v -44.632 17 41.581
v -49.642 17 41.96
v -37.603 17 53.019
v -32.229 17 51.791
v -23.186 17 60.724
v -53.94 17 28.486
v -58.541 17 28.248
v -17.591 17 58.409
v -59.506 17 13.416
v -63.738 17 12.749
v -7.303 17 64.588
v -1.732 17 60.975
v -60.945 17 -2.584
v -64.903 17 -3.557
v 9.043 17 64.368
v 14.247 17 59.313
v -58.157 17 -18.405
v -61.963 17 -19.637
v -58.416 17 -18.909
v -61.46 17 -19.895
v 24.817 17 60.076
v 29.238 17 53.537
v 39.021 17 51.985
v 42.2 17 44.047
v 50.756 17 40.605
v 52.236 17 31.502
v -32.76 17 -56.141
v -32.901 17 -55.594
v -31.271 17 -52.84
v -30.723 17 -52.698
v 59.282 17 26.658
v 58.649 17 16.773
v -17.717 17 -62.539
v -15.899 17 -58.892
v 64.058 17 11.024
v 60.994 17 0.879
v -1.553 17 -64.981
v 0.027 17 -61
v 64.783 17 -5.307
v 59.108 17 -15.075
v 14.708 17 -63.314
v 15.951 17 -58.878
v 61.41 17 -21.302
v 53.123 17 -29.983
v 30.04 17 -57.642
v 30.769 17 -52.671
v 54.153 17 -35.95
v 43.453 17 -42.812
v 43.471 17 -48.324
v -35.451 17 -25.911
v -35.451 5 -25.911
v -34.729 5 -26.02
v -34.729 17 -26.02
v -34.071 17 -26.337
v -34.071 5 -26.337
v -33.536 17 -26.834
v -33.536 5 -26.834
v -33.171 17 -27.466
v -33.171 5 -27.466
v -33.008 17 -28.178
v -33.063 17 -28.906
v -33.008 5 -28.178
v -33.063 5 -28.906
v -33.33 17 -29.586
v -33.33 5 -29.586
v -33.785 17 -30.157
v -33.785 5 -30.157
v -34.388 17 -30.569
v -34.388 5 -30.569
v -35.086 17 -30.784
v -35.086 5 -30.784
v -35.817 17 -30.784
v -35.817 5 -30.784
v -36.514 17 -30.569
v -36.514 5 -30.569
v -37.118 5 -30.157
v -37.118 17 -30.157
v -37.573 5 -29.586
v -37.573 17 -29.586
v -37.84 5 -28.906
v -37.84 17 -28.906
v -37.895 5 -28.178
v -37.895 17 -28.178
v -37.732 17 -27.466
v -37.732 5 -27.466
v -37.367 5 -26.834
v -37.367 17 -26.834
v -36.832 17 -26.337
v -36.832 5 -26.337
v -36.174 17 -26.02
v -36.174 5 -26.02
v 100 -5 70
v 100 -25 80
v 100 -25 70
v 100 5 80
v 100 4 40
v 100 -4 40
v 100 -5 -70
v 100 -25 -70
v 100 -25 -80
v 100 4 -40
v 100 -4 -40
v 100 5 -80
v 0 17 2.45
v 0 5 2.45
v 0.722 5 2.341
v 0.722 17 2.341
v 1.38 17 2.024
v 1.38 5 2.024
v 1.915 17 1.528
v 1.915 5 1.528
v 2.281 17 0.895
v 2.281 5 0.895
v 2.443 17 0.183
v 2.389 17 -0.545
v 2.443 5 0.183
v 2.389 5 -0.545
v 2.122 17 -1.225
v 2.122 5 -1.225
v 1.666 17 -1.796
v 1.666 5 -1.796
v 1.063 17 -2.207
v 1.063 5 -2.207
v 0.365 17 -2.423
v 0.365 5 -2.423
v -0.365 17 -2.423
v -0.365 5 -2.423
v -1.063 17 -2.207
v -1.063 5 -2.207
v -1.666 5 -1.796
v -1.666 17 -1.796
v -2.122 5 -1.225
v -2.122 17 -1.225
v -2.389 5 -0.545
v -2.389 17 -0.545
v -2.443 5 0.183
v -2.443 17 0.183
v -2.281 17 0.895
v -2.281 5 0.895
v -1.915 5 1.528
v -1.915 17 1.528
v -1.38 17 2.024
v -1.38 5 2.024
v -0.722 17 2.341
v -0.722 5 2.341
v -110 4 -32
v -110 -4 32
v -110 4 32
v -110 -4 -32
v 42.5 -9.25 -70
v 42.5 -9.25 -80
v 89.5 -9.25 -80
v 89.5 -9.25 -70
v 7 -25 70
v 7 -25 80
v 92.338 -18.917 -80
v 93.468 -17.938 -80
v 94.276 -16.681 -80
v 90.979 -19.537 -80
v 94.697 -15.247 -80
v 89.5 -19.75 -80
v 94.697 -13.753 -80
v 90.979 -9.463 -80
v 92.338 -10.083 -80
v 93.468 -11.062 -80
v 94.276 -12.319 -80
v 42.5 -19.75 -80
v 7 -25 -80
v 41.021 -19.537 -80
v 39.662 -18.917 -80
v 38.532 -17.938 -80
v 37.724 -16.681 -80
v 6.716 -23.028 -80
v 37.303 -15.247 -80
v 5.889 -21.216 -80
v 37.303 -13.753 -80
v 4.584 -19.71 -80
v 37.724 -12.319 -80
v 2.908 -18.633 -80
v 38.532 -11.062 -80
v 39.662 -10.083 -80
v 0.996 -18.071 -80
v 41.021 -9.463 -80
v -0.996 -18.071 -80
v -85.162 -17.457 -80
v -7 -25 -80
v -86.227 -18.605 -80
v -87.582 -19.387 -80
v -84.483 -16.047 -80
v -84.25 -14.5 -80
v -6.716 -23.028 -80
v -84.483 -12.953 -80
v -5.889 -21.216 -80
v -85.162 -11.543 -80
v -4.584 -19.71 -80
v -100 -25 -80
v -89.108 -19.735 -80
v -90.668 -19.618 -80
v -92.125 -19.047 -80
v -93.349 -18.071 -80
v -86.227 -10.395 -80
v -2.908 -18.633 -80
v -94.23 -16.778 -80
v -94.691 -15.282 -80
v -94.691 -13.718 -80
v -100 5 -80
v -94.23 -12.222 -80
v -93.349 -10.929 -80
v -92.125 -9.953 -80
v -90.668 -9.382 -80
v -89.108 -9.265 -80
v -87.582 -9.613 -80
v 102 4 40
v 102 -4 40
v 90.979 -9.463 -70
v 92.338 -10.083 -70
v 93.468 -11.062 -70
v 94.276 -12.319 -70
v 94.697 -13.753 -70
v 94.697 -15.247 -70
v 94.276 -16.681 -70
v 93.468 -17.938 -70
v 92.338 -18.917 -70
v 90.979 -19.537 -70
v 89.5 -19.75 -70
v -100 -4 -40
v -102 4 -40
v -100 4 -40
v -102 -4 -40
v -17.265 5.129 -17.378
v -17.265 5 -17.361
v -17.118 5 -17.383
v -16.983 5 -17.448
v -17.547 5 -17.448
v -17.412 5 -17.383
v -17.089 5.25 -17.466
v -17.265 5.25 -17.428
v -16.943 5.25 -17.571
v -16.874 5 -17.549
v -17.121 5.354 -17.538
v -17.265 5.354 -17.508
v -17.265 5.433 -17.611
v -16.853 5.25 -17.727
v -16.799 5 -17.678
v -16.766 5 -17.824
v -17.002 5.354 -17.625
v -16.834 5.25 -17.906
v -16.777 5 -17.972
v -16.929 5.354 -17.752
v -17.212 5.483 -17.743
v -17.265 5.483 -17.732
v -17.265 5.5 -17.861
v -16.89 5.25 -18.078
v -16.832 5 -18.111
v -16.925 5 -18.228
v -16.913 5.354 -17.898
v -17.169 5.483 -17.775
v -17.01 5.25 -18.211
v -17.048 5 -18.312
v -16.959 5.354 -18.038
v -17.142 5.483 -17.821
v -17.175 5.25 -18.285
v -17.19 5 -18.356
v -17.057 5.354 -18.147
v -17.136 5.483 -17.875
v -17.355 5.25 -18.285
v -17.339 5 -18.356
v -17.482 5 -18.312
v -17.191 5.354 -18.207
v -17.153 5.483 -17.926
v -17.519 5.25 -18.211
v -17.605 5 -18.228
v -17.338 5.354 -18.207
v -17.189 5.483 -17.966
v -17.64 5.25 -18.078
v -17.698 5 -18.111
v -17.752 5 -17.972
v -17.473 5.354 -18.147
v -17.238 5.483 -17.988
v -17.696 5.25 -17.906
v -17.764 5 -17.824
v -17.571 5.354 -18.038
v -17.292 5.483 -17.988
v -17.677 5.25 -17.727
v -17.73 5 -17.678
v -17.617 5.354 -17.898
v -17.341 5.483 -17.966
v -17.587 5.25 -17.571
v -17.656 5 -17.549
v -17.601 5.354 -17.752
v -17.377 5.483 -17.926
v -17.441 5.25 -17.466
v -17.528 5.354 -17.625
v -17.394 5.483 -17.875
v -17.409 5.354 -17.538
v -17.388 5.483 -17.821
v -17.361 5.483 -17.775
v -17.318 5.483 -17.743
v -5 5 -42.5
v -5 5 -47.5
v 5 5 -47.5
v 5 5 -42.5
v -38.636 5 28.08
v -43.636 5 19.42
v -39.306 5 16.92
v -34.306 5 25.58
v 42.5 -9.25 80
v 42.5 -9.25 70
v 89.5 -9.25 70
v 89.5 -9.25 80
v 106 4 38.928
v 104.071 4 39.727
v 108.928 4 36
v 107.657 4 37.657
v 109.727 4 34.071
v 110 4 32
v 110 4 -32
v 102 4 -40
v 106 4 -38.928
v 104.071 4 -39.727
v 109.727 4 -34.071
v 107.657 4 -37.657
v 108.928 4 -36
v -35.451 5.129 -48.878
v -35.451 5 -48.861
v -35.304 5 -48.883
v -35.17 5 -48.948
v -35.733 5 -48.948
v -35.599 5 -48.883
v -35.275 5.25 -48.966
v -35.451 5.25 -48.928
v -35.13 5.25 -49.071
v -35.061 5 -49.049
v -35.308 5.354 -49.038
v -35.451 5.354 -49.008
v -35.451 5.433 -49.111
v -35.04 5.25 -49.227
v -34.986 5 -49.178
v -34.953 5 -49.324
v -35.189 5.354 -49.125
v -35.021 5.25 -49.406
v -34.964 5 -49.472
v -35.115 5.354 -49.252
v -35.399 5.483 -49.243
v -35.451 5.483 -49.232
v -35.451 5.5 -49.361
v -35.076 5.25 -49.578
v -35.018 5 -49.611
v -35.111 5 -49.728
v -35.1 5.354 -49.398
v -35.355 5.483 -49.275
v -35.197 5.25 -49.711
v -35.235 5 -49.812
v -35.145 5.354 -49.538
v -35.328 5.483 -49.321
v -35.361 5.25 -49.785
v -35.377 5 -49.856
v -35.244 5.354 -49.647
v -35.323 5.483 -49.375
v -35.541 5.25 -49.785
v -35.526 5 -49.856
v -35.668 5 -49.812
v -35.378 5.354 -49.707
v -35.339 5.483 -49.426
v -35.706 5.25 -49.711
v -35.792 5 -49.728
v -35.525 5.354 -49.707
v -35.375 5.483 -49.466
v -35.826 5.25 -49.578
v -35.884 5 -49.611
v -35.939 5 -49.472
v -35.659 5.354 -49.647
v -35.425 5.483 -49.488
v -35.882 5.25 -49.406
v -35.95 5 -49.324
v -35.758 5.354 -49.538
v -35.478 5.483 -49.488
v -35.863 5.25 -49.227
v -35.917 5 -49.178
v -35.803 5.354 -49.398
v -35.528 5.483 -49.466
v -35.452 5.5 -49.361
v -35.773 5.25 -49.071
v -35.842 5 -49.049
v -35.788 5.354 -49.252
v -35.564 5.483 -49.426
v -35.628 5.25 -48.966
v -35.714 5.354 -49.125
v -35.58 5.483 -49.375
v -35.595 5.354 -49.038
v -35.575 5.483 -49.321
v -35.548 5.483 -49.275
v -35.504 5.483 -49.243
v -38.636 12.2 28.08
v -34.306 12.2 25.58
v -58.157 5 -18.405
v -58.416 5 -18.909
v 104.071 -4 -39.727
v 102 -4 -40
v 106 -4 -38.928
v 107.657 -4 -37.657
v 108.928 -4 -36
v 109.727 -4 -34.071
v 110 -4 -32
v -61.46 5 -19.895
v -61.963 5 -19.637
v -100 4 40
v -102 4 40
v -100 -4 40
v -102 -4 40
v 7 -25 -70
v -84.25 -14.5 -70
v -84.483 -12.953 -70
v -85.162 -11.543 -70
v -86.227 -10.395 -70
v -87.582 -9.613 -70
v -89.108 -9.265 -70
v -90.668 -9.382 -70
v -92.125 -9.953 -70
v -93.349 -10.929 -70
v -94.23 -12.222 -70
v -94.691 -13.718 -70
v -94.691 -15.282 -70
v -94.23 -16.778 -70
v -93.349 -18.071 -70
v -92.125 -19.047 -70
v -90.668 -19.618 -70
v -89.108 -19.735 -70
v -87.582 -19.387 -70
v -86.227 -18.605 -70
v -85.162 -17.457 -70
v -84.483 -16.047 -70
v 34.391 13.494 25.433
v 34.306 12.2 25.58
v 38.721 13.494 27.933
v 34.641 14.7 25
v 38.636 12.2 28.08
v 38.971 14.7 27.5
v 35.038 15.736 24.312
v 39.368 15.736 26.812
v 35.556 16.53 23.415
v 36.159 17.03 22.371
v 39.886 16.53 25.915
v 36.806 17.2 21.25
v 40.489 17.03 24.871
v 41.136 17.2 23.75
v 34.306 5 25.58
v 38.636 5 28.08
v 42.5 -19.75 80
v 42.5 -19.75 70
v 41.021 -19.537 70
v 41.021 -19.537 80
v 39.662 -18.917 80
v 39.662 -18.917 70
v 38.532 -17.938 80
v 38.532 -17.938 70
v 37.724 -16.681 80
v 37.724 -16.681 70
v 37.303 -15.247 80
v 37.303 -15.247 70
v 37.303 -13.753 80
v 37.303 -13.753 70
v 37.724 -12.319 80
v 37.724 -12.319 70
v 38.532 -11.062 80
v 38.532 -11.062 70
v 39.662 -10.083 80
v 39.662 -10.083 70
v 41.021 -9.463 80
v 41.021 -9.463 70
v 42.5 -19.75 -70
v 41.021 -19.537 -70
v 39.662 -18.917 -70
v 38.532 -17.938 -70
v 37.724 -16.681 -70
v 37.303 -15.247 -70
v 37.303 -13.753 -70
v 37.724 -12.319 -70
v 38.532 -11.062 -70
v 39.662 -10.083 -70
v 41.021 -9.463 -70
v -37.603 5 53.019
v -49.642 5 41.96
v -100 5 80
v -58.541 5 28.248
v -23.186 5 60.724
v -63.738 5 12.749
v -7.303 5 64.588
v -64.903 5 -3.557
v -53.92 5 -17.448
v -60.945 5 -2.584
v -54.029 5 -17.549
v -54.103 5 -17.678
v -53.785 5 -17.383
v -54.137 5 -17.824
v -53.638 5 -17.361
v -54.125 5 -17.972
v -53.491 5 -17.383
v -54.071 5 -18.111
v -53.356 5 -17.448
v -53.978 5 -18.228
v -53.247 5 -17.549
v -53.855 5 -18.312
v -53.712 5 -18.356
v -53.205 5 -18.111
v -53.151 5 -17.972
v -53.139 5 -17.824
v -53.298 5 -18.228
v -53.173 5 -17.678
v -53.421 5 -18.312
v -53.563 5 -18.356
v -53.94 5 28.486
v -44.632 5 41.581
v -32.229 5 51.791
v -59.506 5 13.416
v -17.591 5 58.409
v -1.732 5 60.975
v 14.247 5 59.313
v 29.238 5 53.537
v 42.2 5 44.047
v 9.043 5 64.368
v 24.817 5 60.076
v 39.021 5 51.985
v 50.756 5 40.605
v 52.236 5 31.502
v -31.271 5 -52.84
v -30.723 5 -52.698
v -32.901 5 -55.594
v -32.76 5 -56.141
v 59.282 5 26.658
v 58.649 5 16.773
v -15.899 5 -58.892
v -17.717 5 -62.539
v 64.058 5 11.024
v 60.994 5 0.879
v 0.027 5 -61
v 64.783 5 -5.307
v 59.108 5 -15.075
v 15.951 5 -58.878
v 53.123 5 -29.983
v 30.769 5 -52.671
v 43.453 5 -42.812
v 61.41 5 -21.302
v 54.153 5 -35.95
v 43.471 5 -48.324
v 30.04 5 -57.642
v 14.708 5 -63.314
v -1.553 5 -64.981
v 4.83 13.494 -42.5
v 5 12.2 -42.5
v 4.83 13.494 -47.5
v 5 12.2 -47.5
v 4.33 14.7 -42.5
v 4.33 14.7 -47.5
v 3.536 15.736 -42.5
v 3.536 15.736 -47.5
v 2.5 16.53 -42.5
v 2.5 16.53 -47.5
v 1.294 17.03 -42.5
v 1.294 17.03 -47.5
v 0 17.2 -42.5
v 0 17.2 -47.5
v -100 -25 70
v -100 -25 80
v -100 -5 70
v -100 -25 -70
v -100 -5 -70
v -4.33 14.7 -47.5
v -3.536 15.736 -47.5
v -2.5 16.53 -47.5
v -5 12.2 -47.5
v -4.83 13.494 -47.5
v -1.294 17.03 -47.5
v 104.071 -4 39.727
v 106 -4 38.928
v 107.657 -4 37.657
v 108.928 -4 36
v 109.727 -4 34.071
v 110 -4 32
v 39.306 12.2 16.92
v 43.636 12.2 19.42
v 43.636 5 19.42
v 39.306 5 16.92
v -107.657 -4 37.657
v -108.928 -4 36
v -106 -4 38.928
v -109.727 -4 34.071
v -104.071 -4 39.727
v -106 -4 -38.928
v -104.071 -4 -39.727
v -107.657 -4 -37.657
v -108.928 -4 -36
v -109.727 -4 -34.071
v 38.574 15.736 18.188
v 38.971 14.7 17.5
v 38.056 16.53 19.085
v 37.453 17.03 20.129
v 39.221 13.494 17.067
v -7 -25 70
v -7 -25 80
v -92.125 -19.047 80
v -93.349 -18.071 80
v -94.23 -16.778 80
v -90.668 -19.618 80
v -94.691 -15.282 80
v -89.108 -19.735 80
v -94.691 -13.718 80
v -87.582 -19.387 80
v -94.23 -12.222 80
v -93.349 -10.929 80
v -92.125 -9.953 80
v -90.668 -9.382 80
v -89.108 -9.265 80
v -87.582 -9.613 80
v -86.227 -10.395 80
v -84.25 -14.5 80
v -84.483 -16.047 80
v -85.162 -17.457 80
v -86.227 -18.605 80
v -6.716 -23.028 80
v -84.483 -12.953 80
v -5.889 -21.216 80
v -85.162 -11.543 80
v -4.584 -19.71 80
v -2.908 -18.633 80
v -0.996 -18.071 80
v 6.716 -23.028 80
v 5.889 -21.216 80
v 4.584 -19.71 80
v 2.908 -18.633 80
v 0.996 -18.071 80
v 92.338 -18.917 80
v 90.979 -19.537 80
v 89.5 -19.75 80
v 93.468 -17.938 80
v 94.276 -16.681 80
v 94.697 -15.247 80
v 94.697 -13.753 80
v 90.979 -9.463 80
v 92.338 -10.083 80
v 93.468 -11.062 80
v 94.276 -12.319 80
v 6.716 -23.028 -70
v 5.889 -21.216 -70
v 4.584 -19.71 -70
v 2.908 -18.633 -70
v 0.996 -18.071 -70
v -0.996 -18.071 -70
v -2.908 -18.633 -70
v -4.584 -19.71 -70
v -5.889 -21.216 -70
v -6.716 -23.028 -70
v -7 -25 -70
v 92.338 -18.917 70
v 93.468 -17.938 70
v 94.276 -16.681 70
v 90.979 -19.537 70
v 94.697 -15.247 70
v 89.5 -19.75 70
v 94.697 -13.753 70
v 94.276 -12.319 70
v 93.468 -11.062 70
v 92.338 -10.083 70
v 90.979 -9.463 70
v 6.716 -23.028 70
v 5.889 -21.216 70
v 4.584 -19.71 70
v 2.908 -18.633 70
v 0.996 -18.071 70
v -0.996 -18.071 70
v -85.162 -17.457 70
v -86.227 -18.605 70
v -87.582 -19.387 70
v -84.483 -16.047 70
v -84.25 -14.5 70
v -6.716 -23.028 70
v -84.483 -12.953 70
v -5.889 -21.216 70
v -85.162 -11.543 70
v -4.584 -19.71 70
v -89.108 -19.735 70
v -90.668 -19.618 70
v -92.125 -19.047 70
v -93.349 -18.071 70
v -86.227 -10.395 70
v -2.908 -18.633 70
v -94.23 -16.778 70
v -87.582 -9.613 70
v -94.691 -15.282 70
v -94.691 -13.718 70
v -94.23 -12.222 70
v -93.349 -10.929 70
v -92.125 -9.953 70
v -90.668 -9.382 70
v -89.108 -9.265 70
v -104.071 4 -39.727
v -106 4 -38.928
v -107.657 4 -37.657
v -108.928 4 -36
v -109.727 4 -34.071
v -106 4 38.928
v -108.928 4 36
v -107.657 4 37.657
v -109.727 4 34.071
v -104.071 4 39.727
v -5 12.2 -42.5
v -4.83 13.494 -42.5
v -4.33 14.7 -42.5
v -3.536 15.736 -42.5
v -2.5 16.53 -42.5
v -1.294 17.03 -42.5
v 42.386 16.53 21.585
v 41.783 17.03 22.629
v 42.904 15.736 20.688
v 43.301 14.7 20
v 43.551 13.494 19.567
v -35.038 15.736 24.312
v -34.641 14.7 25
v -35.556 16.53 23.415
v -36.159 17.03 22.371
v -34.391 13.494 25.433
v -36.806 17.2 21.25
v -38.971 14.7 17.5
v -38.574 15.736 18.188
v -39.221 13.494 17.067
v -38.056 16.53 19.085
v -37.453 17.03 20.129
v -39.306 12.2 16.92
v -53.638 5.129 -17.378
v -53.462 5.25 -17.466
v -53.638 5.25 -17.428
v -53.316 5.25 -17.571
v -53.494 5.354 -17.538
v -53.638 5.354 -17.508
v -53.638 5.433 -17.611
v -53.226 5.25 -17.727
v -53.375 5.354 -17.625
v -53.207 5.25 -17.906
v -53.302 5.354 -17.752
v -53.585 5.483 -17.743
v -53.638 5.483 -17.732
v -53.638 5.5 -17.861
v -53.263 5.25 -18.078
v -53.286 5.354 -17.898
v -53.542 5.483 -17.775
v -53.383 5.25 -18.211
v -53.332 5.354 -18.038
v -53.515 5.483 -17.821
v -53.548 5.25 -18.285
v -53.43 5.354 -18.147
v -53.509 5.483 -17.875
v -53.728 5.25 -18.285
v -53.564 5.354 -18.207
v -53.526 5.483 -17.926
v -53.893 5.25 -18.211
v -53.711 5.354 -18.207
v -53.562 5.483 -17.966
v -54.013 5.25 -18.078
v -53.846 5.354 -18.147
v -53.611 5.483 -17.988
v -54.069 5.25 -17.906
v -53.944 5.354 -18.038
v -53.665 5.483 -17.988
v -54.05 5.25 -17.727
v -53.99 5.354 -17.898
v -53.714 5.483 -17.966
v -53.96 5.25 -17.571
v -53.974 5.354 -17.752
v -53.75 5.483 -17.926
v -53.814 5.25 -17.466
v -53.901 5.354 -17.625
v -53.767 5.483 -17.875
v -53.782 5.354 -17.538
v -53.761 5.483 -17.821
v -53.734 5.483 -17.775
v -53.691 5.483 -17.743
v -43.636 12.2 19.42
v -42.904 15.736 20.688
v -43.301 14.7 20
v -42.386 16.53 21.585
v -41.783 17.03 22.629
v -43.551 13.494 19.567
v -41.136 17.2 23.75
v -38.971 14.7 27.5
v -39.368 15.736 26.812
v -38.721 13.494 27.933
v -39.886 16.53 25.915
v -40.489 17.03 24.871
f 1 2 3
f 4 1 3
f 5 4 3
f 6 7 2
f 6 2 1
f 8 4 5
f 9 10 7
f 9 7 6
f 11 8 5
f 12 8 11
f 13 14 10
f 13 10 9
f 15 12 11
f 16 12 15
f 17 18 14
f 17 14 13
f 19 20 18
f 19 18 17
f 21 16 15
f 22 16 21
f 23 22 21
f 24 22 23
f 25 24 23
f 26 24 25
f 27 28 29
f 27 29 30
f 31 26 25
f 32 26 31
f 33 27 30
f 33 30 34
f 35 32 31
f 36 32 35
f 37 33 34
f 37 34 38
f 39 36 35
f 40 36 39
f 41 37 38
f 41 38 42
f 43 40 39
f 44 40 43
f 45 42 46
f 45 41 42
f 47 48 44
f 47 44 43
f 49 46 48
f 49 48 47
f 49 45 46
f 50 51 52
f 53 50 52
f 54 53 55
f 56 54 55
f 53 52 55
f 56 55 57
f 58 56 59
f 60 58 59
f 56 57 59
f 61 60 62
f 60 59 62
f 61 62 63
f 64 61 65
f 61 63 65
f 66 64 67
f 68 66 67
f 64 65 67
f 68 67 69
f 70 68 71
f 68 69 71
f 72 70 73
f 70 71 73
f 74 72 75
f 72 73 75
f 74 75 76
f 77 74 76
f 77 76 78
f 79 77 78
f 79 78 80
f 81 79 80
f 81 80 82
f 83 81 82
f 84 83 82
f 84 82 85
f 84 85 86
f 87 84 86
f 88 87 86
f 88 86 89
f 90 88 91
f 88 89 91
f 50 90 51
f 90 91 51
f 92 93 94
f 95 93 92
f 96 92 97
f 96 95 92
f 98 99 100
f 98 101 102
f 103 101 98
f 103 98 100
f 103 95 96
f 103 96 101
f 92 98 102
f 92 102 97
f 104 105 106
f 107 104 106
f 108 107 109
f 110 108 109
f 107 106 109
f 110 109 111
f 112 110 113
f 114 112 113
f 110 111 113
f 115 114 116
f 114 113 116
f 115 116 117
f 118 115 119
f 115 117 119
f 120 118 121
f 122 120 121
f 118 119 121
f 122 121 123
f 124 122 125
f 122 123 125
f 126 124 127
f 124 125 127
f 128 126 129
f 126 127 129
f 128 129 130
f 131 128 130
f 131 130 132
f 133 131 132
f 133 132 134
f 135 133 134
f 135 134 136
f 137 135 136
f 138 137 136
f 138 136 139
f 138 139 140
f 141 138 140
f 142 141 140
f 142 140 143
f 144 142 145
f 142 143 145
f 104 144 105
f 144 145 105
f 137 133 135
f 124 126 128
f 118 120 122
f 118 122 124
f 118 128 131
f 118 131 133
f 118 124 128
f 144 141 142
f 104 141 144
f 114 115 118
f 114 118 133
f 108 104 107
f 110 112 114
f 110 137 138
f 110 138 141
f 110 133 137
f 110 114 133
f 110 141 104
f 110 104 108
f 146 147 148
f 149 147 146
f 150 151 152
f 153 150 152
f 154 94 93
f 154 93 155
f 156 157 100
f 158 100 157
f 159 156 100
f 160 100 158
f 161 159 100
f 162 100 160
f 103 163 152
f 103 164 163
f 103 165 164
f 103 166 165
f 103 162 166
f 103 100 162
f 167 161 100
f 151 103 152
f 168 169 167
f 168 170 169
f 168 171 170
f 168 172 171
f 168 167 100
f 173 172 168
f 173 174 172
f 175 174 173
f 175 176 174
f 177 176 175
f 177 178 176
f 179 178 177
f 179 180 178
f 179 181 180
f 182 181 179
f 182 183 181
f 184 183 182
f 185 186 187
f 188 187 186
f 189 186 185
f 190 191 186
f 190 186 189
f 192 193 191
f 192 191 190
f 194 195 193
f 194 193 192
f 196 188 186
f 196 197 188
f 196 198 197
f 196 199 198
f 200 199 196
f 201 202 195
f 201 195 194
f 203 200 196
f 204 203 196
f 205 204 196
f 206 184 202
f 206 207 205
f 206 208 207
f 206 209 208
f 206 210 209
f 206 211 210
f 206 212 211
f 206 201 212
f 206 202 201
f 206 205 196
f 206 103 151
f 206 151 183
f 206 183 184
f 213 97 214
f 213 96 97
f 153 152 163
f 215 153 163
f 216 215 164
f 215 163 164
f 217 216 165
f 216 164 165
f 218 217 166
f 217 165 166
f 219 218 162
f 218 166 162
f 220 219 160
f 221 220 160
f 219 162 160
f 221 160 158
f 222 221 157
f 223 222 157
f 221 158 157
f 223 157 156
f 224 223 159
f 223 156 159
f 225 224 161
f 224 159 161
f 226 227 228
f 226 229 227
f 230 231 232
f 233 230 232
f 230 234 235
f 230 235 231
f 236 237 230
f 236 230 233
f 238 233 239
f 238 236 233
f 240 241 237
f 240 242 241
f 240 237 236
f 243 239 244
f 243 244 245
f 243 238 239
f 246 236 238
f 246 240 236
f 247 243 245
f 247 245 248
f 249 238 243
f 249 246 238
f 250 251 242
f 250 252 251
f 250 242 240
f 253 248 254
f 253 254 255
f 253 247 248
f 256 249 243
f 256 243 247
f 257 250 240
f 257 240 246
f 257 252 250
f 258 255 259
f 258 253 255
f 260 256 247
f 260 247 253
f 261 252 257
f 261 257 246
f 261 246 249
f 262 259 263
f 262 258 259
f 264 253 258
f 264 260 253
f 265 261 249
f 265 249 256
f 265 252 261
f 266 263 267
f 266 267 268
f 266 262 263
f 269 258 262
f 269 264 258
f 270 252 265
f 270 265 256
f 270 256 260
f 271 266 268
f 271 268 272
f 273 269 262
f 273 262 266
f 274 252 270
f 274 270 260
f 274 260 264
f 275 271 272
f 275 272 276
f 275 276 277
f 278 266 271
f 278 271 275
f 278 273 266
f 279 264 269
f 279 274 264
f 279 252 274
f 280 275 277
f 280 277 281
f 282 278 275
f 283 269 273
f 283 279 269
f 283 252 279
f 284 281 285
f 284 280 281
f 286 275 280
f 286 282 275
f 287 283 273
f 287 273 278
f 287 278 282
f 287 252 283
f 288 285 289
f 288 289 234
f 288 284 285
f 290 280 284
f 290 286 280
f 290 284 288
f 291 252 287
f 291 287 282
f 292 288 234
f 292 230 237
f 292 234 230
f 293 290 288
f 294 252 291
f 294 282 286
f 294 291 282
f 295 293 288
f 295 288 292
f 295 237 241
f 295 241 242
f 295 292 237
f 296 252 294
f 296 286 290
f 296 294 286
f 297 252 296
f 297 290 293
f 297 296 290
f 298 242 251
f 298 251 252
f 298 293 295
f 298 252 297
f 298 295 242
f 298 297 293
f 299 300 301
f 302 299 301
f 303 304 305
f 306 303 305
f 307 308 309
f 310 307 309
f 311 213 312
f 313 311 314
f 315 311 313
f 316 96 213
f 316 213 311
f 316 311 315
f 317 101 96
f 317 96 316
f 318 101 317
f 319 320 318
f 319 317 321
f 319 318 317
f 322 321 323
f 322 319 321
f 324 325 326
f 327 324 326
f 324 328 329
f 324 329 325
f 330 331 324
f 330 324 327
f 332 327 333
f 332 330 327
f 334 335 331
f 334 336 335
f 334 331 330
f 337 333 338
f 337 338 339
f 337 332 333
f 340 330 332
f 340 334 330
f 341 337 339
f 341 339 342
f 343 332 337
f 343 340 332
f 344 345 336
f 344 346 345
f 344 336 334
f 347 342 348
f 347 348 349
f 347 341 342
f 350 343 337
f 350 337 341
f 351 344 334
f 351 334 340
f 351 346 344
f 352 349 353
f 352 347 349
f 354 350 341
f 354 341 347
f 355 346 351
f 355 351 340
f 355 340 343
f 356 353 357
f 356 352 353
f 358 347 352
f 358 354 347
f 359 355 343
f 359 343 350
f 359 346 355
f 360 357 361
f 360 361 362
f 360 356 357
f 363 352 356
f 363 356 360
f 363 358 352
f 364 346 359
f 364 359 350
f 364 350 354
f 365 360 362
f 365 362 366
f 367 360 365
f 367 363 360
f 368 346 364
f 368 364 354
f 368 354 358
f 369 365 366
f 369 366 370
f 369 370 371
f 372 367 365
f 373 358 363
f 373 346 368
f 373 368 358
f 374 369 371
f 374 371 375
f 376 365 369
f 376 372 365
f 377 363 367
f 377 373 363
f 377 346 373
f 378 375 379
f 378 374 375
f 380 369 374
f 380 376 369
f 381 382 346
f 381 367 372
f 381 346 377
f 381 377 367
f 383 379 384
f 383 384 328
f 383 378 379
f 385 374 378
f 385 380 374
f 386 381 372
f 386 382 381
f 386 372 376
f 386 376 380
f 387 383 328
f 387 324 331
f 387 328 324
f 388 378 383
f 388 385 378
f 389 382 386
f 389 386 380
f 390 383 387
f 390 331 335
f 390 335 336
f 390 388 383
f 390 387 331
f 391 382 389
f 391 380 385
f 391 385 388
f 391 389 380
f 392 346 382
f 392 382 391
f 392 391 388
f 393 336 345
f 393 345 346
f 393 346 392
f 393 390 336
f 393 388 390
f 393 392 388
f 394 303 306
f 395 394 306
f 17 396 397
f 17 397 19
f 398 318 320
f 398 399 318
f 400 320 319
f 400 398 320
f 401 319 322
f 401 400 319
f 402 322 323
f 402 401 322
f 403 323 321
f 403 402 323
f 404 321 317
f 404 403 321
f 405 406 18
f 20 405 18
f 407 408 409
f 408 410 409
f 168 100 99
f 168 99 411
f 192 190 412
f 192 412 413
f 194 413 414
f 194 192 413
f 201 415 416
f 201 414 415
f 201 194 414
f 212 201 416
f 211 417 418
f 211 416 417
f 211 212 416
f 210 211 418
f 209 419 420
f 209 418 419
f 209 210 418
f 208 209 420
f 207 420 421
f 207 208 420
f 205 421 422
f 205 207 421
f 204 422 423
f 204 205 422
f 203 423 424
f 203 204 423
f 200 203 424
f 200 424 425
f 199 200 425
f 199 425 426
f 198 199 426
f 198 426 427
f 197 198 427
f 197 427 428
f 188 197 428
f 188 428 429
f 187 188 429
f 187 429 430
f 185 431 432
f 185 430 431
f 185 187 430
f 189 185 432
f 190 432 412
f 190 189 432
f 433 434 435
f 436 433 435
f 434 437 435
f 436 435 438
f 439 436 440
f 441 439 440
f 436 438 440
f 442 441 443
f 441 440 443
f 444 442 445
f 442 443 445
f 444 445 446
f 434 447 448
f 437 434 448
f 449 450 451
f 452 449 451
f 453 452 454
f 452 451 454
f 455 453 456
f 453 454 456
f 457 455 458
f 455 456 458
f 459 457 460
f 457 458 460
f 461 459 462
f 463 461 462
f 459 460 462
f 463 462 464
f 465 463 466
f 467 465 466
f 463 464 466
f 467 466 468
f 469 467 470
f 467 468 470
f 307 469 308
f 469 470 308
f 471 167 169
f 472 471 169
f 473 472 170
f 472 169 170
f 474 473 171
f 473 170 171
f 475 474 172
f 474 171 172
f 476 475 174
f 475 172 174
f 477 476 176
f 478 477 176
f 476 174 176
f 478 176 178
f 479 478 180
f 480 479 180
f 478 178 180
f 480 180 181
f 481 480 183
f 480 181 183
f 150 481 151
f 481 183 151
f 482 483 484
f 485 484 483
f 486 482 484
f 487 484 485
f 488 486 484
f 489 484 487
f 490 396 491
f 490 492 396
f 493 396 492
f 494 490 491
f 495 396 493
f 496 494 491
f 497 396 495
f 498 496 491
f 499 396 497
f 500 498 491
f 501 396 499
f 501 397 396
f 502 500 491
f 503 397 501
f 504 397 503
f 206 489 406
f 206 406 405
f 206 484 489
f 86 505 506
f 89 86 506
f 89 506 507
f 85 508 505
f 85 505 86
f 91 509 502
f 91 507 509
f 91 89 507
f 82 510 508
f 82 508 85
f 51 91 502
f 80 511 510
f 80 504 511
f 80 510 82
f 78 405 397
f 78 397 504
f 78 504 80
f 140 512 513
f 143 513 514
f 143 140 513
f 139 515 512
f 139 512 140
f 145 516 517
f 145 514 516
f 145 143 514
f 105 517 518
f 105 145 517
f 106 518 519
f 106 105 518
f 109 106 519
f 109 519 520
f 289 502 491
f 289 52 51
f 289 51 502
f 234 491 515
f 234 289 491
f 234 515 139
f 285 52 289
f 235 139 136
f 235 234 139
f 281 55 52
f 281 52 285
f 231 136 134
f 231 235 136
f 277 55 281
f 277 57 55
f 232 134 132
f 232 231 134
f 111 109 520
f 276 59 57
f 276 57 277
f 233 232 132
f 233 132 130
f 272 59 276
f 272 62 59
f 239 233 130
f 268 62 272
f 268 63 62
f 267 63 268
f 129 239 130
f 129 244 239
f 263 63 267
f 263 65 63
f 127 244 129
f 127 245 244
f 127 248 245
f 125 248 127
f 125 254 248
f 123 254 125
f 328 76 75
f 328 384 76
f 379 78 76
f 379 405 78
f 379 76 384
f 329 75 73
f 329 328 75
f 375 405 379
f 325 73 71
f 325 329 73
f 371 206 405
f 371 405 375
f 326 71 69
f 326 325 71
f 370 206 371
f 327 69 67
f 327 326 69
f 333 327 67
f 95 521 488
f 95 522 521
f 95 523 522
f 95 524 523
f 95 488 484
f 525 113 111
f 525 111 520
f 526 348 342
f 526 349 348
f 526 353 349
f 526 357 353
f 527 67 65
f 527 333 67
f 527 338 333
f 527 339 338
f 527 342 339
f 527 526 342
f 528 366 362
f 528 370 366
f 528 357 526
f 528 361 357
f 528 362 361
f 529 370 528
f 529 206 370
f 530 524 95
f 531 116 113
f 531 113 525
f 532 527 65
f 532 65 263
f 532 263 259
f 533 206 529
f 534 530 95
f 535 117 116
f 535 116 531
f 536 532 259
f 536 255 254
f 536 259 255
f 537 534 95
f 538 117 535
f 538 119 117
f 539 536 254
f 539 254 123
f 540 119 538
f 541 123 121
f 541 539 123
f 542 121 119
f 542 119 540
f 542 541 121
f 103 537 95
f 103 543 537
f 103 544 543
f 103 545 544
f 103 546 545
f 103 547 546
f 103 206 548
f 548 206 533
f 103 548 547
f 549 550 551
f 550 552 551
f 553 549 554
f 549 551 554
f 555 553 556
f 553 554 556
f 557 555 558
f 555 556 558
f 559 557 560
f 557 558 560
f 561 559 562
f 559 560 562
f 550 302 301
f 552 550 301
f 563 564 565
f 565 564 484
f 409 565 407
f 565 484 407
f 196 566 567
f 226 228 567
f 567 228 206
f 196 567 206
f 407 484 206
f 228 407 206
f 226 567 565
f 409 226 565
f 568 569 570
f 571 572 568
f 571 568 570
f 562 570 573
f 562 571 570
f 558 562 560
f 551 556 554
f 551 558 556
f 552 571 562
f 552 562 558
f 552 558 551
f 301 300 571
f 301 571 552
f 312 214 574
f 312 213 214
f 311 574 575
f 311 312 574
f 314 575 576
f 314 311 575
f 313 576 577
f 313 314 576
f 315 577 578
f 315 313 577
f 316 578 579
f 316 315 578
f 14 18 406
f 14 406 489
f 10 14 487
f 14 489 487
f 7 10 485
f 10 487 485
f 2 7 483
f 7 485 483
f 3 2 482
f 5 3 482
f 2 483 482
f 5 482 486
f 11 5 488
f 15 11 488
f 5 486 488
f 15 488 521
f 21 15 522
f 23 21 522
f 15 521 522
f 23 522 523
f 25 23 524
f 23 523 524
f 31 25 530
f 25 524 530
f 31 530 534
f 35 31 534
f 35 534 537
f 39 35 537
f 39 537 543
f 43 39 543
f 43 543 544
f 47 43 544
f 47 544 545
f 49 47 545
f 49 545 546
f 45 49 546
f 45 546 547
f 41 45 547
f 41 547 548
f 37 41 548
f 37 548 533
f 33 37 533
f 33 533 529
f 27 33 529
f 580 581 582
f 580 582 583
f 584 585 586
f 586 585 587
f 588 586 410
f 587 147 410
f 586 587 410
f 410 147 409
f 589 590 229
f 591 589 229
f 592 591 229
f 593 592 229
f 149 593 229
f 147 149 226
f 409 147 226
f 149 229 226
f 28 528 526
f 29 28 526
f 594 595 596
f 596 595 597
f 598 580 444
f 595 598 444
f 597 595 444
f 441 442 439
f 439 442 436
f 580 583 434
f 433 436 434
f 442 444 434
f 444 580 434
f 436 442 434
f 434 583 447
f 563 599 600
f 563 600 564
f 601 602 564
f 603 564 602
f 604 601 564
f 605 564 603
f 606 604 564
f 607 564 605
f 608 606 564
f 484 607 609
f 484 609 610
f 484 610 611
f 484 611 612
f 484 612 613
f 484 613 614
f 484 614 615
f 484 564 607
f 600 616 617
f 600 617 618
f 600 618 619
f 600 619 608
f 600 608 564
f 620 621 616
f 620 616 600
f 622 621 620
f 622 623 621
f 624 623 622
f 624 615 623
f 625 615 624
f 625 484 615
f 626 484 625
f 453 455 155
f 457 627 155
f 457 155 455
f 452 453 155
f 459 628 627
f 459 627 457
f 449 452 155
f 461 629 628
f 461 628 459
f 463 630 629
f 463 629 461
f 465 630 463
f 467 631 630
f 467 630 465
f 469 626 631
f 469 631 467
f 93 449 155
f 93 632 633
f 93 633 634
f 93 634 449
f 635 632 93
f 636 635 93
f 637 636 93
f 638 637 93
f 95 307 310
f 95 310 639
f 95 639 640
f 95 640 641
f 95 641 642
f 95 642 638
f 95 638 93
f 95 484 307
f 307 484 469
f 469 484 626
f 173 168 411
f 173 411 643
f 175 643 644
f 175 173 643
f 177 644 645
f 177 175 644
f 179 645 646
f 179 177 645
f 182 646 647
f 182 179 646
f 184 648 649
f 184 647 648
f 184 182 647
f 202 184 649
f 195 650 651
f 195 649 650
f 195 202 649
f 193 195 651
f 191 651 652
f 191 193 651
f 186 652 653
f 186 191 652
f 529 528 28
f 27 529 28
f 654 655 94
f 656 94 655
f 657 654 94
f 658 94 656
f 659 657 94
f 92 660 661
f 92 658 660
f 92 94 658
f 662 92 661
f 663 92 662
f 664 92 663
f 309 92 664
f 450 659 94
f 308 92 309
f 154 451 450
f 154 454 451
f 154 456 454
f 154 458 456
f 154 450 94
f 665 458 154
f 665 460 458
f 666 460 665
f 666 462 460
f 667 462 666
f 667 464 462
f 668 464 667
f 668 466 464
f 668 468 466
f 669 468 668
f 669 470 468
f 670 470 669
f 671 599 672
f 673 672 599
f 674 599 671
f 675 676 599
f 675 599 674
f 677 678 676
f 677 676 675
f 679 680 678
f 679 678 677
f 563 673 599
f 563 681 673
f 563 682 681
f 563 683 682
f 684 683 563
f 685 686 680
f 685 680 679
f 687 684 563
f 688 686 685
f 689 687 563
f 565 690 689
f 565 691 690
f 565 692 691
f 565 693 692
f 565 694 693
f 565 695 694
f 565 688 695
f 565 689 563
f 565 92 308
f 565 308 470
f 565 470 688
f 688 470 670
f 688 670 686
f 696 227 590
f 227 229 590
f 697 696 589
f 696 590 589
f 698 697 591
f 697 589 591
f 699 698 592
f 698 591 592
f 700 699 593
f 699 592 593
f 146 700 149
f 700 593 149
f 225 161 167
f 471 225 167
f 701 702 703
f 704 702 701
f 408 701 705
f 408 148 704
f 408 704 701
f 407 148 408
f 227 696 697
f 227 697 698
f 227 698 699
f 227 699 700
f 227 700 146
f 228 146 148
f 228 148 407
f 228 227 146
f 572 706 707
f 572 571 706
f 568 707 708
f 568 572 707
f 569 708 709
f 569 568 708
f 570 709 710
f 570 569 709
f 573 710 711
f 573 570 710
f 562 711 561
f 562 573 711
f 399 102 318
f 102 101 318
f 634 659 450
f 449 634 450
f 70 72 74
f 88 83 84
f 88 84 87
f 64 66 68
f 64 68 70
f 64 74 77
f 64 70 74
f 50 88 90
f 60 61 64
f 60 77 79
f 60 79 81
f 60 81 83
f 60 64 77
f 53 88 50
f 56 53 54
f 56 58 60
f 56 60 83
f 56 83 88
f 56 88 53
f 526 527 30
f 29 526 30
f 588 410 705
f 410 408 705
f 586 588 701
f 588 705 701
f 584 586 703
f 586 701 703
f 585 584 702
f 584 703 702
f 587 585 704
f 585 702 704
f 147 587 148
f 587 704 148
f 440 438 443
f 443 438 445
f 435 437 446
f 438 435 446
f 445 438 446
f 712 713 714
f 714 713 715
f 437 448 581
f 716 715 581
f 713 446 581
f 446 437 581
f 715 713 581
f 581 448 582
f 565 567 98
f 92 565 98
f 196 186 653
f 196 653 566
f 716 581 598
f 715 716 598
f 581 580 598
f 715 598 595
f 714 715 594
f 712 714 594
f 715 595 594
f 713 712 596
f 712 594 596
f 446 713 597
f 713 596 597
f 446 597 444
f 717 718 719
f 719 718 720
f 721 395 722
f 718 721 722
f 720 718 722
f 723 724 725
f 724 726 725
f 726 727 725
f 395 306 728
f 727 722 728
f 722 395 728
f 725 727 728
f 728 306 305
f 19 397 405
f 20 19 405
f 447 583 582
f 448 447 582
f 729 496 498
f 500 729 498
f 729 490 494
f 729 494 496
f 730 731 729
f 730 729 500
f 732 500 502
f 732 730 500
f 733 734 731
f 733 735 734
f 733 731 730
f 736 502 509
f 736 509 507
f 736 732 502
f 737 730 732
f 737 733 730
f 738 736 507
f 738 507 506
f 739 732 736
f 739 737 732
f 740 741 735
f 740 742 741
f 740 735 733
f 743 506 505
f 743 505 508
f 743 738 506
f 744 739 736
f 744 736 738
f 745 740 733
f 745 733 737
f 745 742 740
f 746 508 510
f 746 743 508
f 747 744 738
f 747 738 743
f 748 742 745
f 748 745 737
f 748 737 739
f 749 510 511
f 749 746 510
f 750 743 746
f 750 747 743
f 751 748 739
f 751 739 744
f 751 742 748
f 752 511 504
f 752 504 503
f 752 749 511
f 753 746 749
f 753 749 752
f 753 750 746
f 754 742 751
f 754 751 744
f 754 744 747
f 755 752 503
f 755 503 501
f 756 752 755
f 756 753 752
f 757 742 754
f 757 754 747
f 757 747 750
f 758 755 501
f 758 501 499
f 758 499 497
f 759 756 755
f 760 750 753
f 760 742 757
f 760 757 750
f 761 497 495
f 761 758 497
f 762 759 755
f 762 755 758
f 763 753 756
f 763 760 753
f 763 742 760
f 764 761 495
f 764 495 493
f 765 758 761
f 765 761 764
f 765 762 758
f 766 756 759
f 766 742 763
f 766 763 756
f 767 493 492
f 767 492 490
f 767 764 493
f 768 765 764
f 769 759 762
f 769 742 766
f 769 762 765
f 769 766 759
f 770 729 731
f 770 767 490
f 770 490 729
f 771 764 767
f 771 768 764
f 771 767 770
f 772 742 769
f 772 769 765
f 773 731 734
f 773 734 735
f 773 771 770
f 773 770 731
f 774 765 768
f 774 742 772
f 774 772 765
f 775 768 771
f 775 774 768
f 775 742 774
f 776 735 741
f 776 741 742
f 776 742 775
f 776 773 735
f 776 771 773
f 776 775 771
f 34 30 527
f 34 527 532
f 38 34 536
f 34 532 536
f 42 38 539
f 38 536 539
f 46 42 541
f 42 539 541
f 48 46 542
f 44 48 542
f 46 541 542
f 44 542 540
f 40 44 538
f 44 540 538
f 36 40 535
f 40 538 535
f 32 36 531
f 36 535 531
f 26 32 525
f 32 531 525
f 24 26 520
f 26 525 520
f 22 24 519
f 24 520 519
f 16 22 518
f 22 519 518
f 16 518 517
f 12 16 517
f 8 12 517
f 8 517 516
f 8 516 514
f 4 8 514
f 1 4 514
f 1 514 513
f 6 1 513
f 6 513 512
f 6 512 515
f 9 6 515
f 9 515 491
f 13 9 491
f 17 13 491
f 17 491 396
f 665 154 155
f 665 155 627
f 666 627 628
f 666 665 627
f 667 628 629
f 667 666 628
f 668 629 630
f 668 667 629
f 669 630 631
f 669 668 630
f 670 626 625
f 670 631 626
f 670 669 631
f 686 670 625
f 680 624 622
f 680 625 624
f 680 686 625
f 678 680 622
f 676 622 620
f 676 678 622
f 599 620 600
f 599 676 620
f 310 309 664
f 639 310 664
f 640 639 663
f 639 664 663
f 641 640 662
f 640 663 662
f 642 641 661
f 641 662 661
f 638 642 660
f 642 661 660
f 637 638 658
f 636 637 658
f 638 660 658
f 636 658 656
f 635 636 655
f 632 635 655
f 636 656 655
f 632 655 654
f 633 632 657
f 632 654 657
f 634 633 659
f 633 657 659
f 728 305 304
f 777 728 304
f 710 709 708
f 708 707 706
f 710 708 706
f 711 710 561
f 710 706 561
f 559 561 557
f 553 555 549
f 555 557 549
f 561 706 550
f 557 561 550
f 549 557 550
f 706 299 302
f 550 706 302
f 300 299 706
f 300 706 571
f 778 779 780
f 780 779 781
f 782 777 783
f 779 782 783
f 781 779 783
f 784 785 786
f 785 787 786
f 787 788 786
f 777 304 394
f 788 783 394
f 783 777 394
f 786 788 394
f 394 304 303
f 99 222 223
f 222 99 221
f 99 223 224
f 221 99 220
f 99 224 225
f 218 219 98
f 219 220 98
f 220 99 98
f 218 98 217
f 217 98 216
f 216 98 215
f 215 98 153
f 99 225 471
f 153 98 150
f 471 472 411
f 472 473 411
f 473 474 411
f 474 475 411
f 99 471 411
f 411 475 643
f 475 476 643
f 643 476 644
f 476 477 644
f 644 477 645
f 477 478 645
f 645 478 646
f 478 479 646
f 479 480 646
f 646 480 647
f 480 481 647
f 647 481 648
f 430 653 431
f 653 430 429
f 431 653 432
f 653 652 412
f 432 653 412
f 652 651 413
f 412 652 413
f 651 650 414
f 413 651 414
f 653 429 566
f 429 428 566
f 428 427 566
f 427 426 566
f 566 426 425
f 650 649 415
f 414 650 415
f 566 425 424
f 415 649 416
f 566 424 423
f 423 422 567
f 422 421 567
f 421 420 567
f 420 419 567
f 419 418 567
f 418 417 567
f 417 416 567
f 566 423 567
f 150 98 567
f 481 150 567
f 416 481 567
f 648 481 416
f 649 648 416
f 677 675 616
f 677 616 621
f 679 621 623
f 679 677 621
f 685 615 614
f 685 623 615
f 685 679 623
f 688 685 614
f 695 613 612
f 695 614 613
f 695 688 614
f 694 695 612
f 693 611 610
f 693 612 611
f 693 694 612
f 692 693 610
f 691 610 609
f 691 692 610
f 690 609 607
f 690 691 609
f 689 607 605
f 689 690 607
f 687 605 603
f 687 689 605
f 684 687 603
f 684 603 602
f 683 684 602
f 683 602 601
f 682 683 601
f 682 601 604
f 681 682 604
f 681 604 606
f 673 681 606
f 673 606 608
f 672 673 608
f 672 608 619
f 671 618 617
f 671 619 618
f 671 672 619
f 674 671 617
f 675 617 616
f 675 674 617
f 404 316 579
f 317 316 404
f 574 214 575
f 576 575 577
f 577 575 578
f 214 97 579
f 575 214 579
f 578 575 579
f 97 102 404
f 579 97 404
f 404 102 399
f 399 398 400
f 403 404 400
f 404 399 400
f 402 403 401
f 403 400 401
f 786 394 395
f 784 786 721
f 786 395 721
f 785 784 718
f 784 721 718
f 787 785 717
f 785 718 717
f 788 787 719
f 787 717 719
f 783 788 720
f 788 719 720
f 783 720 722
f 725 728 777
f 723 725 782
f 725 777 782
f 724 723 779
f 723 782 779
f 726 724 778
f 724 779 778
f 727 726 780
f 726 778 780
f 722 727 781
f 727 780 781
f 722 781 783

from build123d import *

# Parameters (mm, degrees)
SKIZZE1_W                            = 200
SKIZZE1_H                            = 160
AUFSATZ_LINEAR_AUSTRAGEN1_DEPTH      = 5
SKIZZE2_W                            = 200
SKIZZE2_H                            = 10
AUFSATZ_LINEAR_AUSTRAGEN2_DEPTH      = 20
SCHNITT_LINEAR_AUSTRAGEN1_DEPTH      = 131.479883507
SCHNITT_LINEAR_AUSTRAGEN1_DEPTH_BACK = 131.479883507
SKIZZE3_R                            = 5.25
SKIZZE4_R                            = 2.45
AUFSATZ_LINEAR_AUSTRAGEN3_DEPTH      = 12
FASE1_SIZE                           = 0.4
AUFSATZ_LINEAR_AUSTRAGEN4_DEPTH      = 12.2
AUFSATZ_LINEAR_AUSTRAGEN4_2_DEPTH    = 12.2
SKIZZE6_W                            = 10
SKIZZE6_H                            = 5
AUFSATZ_LINEAR_AUSTRAGEN4_3_DEPTH    = 12.2
VERRUNDUNG1_R                        = 5
VERRUNDUNG2_R                        = 5
VERRUNDUNG3_R                        = 5
SKIZZE7_W                            = 10
SKIZZE7_H                            = 80
AUFSATZ_LINEAR_AUSTRAGEN5_DEPTH      = 4
VERRUNDUNG4_R                        = 8
SKIZZE8_R                            = 0.5
AUFSATZ_LINEAR_AUSTRAGEN6_DEPTH      = 0.5
VERRUNDUNG5_R                        = 0.5


with BuildPart() as part:
    # Skizze1 → Aufsatz-Linear austragen1 (new, symmetric)
    with BuildSketch(Plane(origin=(0, 0, 0), x_dir=(1, 0, 0), z_dir=(0, 1, 0))):
        Rectangle(SKIZZE1_W, SKIZZE1_H)
    extrude(amount=AUFSATZ_LINEAR_AUSTRAGEN1_DEPTH, both=True)

    # Skizze2 → Aufsatz-Linear austragen2 (add)
    with BuildSketch(Plane(origin=(0, -5, 0), x_dir=(-1, 0, 0), z_dir=(0, -1, 0))):
        with Locations((0, 75)):
            Rectangle(SKIZZE2_W, SKIZZE2_H)
        with Locations((0, -75)):
            Rectangle(SKIZZE2_W, SKIZZE2_H)
    extrude(amount=AUFSATZ_LINEAR_AUSTRAGEN2_DEPTH)

    # Skizze3 → Schnitt-Linear austragen1 (cut, two sides: drawn at the far end of the back side and taken through both)
    with BuildSketch(Plane.XY.offset(-SCHNITT_LINEAR_AUSTRAGEN1_DEPTH_BACK)):
        with Locations((-89.5, -14.5)):
            Circle(SKIZZE3_R)
        with BuildLine():
            Line((42.5, -9.25), (89.5, -9.25))
            ThreePointArc((89.5, -9.25), (94.75, -14.5), (89.5, -19.75))
            Line((89.5, -19.75), (42.5, -19.75))
            ThreePointArc((42.5, -19.75), (37.25, -14.5), (42.5, -9.25))
        make_face()
        with BuildLine():
            Line((-7, -25), (7, -25))
            ThreePointArc((7, -25), (0, -18), (-7, -25))
        make_face()
    extrude(amount=SCHNITT_LINEAR_AUSTRAGEN1_DEPTH + SCHNITT_LINEAR_AUSTRAGEN1_DEPTH_BACK, mode=Mode.SUBTRACT)

    # Skizze4 → Aufsatz-Linear austragen3 (add)
    with BuildSketch(Plane(origin=(0, 5, 0), x_dir=(1, 0, 0), z_dir=(0, 1, 0))):
        with Locations(Location((0, 0, 0), (0, 0, 270))):
            Circle(SKIZZE4_R)
        with Locations(Location((-35.451443949, 28.361155159, 0), (0, 0, 270))):
            Circle(SKIZZE4_R)
        with BuildLine():
            Line((-58.035118175, 18.786299755), (-61.840699694, 20.018188263))
            ThreePointArc((-61.840699694, 20.018188263), (50.756472614, -40.605178091), (-33.104727507, 55.938153498))
            Line((-33.104727507, 55.938153498), (-31.067513506, 52.49580559))
            ThreePointArc((-31.067513506, 52.49580559), (47.632997376, -38.106397901), (-58.035118175, 18.786299755))
        make_face()
    extrude(amount=AUFSATZ_LINEAR_AUSTRAGEN3_DEPTH)

    # Fase1
    fase1_edges = [part.edges().sort_by_distance(p)[0] for p in [
        (-31.067513506, 11, -52.49580559),
        (-58.035118175, 11, -18.786299755),
        (-61.840699694, 11, -20.018188263),
        (-33.104727507, 11, -55.938153498),
    ]]
    chamfer(fase1_edges, length=FASE1_SIZE)

    # Skizze7 → Aufsatz-Linear austragen5 (add, symmetric)
    with BuildSketch(Plane(origin=(0, 0, 0), x_dir=(1, 0, 0), z_dir=(0, 1, 0))):
        with Locations((-105, 0)):
            Rectangle(SKIZZE7_W, SKIZZE7_H)
        with Locations((105, 0)):
            Rectangle(SKIZZE7_W, SKIZZE7_H)
    extrude(amount=AUFSATZ_LINEAR_AUSTRAGEN5_DEPTH, both=True)

    # Verrundung4
    verrundung4_edges = [part.edges().sort_by_distance(p)[0] for p in [
        (-110, 0, -40),
        (-110, 0, 40),
        (110, 0, -40),
        (110, 0, 40),
    ]]
    fillet(verrundung4_edges, radius=VERRUNDUNG4_R)

    # Skizze8 → Aufsatz-Linear austragen6 (add)
    with BuildSketch(Plane(origin=(0, 5, 0), x_dir=(1, 0, 0), z_dir=(0, 1, 0))):
        with Locations(Location((-35.451443949, 49.361155159, 0), (0, 0, 270))):
            Circle(SKIZZE8_R)
        with Locations(Location((-53.637977428, 17.861155159, 0), (0, 0, 270))):
            Circle(SKIZZE8_R)
        with Locations(Location((-17.264910469, 17.861155159, 0), (0, 0, 270))):
            Circle(SKIZZE8_R)
    extrude(amount=AUFSATZ_LINEAR_AUSTRAGEN6_DEPTH)

    # Verrundung5
    verrundung5_edges = [part.edges().sort_by_distance(p)[0] for p in [
        (-35.451443949, 5.5, -49.861155159),
        (-53.637977428, 5.5, -18.361155159),
        (-17.264910469, 5.5, -18.361155159),
    ]]
    fillet(verrundung5_edges, radius=VERRUNDUNG5_R - 0.0001)  # a hair under: the kernel refuses the full size


with BuildPart() as body_2:
    # Skizze6 → Aufsatz-Linear austragen4 (new body)
    with BuildSketch(Plane(origin=(0, 5, 0), x_dir=(1, 0, 0), z_dir=(0, 1, 0))):
        Polygon((43.63620668, -19.419872981), (39.306079661, -16.919872981), (34.306079661, -25.580127019), (38.63620668, -28.080127019), align=None)
    extrude(amount=AUFSATZ_LINEAR_AUSTRAGEN4_DEPTH)

    # Verrundung1
    verrundung1_edges = [body_2.edges().sort_by_distance(p)[0] for p in [
        (36.47114317, 17.2, 26.830127019),
        (41.47114317, 17.2, 18.169872981),
    ]]
    fillet(verrundung1_edges, radius=VERRUNDUNG1_R - 0.0001)  # a hair under: the kernel refuses the full size


with BuildPart() as body_3:
    # Skizze6 → Aufsatz-Linear austragen4 2 (new body)
    with BuildSketch(Plane(origin=(0, 5, 0), x_dir=(1, 0, 0), z_dir=(0, 1, 0))):
        Polygon((-34.306079661, -25.580127019), (-39.306079661, -16.919872981), (-43.63620668, -19.419872981), (-38.63620668, -28.080127019), align=None)
    extrude(amount=AUFSATZ_LINEAR_AUSTRAGEN4_2_DEPTH)

    # Verrundung2
    verrundung2_edges = [body_3.edges().sort_by_distance(p)[0] for p in [
        (-36.47114317, 17.2, 26.830127019),
        (-41.47114317, 17.2, 18.169872981),
    ]]
    fillet(verrundung2_edges, radius=VERRUNDUNG2_R - 0.0001)  # a hair under: the kernel refuses the full size


with BuildPart() as body_4:
    # Skizze6 → Aufsatz-Linear austragen4 3 (new body)
    with BuildSketch(Plane(origin=(0, 5, 0), x_dir=(1, 0, 0), z_dir=(0, 1, 0))):
        with Locations((0, 45)):
            Rectangle(SKIZZE6_W, SKIZZE6_H)
    extrude(amount=AUFSATZ_LINEAR_AUSTRAGEN4_3_DEPTH)

    # Verrundung3
    verrundung3_edges = [body_4.edges().sort_by_distance(p)[0] for p in [
        (-5, 17.2, -45),
        (5, 17.2, -45),
    ]]
    fillet(verrundung3_edges, radius=VERRUNDUNG3_R - 0.0001)  # a hair under: the kernel refuses the full size


solid = Compound([part.part, body_2.part, body_3.part, body_4.part])
